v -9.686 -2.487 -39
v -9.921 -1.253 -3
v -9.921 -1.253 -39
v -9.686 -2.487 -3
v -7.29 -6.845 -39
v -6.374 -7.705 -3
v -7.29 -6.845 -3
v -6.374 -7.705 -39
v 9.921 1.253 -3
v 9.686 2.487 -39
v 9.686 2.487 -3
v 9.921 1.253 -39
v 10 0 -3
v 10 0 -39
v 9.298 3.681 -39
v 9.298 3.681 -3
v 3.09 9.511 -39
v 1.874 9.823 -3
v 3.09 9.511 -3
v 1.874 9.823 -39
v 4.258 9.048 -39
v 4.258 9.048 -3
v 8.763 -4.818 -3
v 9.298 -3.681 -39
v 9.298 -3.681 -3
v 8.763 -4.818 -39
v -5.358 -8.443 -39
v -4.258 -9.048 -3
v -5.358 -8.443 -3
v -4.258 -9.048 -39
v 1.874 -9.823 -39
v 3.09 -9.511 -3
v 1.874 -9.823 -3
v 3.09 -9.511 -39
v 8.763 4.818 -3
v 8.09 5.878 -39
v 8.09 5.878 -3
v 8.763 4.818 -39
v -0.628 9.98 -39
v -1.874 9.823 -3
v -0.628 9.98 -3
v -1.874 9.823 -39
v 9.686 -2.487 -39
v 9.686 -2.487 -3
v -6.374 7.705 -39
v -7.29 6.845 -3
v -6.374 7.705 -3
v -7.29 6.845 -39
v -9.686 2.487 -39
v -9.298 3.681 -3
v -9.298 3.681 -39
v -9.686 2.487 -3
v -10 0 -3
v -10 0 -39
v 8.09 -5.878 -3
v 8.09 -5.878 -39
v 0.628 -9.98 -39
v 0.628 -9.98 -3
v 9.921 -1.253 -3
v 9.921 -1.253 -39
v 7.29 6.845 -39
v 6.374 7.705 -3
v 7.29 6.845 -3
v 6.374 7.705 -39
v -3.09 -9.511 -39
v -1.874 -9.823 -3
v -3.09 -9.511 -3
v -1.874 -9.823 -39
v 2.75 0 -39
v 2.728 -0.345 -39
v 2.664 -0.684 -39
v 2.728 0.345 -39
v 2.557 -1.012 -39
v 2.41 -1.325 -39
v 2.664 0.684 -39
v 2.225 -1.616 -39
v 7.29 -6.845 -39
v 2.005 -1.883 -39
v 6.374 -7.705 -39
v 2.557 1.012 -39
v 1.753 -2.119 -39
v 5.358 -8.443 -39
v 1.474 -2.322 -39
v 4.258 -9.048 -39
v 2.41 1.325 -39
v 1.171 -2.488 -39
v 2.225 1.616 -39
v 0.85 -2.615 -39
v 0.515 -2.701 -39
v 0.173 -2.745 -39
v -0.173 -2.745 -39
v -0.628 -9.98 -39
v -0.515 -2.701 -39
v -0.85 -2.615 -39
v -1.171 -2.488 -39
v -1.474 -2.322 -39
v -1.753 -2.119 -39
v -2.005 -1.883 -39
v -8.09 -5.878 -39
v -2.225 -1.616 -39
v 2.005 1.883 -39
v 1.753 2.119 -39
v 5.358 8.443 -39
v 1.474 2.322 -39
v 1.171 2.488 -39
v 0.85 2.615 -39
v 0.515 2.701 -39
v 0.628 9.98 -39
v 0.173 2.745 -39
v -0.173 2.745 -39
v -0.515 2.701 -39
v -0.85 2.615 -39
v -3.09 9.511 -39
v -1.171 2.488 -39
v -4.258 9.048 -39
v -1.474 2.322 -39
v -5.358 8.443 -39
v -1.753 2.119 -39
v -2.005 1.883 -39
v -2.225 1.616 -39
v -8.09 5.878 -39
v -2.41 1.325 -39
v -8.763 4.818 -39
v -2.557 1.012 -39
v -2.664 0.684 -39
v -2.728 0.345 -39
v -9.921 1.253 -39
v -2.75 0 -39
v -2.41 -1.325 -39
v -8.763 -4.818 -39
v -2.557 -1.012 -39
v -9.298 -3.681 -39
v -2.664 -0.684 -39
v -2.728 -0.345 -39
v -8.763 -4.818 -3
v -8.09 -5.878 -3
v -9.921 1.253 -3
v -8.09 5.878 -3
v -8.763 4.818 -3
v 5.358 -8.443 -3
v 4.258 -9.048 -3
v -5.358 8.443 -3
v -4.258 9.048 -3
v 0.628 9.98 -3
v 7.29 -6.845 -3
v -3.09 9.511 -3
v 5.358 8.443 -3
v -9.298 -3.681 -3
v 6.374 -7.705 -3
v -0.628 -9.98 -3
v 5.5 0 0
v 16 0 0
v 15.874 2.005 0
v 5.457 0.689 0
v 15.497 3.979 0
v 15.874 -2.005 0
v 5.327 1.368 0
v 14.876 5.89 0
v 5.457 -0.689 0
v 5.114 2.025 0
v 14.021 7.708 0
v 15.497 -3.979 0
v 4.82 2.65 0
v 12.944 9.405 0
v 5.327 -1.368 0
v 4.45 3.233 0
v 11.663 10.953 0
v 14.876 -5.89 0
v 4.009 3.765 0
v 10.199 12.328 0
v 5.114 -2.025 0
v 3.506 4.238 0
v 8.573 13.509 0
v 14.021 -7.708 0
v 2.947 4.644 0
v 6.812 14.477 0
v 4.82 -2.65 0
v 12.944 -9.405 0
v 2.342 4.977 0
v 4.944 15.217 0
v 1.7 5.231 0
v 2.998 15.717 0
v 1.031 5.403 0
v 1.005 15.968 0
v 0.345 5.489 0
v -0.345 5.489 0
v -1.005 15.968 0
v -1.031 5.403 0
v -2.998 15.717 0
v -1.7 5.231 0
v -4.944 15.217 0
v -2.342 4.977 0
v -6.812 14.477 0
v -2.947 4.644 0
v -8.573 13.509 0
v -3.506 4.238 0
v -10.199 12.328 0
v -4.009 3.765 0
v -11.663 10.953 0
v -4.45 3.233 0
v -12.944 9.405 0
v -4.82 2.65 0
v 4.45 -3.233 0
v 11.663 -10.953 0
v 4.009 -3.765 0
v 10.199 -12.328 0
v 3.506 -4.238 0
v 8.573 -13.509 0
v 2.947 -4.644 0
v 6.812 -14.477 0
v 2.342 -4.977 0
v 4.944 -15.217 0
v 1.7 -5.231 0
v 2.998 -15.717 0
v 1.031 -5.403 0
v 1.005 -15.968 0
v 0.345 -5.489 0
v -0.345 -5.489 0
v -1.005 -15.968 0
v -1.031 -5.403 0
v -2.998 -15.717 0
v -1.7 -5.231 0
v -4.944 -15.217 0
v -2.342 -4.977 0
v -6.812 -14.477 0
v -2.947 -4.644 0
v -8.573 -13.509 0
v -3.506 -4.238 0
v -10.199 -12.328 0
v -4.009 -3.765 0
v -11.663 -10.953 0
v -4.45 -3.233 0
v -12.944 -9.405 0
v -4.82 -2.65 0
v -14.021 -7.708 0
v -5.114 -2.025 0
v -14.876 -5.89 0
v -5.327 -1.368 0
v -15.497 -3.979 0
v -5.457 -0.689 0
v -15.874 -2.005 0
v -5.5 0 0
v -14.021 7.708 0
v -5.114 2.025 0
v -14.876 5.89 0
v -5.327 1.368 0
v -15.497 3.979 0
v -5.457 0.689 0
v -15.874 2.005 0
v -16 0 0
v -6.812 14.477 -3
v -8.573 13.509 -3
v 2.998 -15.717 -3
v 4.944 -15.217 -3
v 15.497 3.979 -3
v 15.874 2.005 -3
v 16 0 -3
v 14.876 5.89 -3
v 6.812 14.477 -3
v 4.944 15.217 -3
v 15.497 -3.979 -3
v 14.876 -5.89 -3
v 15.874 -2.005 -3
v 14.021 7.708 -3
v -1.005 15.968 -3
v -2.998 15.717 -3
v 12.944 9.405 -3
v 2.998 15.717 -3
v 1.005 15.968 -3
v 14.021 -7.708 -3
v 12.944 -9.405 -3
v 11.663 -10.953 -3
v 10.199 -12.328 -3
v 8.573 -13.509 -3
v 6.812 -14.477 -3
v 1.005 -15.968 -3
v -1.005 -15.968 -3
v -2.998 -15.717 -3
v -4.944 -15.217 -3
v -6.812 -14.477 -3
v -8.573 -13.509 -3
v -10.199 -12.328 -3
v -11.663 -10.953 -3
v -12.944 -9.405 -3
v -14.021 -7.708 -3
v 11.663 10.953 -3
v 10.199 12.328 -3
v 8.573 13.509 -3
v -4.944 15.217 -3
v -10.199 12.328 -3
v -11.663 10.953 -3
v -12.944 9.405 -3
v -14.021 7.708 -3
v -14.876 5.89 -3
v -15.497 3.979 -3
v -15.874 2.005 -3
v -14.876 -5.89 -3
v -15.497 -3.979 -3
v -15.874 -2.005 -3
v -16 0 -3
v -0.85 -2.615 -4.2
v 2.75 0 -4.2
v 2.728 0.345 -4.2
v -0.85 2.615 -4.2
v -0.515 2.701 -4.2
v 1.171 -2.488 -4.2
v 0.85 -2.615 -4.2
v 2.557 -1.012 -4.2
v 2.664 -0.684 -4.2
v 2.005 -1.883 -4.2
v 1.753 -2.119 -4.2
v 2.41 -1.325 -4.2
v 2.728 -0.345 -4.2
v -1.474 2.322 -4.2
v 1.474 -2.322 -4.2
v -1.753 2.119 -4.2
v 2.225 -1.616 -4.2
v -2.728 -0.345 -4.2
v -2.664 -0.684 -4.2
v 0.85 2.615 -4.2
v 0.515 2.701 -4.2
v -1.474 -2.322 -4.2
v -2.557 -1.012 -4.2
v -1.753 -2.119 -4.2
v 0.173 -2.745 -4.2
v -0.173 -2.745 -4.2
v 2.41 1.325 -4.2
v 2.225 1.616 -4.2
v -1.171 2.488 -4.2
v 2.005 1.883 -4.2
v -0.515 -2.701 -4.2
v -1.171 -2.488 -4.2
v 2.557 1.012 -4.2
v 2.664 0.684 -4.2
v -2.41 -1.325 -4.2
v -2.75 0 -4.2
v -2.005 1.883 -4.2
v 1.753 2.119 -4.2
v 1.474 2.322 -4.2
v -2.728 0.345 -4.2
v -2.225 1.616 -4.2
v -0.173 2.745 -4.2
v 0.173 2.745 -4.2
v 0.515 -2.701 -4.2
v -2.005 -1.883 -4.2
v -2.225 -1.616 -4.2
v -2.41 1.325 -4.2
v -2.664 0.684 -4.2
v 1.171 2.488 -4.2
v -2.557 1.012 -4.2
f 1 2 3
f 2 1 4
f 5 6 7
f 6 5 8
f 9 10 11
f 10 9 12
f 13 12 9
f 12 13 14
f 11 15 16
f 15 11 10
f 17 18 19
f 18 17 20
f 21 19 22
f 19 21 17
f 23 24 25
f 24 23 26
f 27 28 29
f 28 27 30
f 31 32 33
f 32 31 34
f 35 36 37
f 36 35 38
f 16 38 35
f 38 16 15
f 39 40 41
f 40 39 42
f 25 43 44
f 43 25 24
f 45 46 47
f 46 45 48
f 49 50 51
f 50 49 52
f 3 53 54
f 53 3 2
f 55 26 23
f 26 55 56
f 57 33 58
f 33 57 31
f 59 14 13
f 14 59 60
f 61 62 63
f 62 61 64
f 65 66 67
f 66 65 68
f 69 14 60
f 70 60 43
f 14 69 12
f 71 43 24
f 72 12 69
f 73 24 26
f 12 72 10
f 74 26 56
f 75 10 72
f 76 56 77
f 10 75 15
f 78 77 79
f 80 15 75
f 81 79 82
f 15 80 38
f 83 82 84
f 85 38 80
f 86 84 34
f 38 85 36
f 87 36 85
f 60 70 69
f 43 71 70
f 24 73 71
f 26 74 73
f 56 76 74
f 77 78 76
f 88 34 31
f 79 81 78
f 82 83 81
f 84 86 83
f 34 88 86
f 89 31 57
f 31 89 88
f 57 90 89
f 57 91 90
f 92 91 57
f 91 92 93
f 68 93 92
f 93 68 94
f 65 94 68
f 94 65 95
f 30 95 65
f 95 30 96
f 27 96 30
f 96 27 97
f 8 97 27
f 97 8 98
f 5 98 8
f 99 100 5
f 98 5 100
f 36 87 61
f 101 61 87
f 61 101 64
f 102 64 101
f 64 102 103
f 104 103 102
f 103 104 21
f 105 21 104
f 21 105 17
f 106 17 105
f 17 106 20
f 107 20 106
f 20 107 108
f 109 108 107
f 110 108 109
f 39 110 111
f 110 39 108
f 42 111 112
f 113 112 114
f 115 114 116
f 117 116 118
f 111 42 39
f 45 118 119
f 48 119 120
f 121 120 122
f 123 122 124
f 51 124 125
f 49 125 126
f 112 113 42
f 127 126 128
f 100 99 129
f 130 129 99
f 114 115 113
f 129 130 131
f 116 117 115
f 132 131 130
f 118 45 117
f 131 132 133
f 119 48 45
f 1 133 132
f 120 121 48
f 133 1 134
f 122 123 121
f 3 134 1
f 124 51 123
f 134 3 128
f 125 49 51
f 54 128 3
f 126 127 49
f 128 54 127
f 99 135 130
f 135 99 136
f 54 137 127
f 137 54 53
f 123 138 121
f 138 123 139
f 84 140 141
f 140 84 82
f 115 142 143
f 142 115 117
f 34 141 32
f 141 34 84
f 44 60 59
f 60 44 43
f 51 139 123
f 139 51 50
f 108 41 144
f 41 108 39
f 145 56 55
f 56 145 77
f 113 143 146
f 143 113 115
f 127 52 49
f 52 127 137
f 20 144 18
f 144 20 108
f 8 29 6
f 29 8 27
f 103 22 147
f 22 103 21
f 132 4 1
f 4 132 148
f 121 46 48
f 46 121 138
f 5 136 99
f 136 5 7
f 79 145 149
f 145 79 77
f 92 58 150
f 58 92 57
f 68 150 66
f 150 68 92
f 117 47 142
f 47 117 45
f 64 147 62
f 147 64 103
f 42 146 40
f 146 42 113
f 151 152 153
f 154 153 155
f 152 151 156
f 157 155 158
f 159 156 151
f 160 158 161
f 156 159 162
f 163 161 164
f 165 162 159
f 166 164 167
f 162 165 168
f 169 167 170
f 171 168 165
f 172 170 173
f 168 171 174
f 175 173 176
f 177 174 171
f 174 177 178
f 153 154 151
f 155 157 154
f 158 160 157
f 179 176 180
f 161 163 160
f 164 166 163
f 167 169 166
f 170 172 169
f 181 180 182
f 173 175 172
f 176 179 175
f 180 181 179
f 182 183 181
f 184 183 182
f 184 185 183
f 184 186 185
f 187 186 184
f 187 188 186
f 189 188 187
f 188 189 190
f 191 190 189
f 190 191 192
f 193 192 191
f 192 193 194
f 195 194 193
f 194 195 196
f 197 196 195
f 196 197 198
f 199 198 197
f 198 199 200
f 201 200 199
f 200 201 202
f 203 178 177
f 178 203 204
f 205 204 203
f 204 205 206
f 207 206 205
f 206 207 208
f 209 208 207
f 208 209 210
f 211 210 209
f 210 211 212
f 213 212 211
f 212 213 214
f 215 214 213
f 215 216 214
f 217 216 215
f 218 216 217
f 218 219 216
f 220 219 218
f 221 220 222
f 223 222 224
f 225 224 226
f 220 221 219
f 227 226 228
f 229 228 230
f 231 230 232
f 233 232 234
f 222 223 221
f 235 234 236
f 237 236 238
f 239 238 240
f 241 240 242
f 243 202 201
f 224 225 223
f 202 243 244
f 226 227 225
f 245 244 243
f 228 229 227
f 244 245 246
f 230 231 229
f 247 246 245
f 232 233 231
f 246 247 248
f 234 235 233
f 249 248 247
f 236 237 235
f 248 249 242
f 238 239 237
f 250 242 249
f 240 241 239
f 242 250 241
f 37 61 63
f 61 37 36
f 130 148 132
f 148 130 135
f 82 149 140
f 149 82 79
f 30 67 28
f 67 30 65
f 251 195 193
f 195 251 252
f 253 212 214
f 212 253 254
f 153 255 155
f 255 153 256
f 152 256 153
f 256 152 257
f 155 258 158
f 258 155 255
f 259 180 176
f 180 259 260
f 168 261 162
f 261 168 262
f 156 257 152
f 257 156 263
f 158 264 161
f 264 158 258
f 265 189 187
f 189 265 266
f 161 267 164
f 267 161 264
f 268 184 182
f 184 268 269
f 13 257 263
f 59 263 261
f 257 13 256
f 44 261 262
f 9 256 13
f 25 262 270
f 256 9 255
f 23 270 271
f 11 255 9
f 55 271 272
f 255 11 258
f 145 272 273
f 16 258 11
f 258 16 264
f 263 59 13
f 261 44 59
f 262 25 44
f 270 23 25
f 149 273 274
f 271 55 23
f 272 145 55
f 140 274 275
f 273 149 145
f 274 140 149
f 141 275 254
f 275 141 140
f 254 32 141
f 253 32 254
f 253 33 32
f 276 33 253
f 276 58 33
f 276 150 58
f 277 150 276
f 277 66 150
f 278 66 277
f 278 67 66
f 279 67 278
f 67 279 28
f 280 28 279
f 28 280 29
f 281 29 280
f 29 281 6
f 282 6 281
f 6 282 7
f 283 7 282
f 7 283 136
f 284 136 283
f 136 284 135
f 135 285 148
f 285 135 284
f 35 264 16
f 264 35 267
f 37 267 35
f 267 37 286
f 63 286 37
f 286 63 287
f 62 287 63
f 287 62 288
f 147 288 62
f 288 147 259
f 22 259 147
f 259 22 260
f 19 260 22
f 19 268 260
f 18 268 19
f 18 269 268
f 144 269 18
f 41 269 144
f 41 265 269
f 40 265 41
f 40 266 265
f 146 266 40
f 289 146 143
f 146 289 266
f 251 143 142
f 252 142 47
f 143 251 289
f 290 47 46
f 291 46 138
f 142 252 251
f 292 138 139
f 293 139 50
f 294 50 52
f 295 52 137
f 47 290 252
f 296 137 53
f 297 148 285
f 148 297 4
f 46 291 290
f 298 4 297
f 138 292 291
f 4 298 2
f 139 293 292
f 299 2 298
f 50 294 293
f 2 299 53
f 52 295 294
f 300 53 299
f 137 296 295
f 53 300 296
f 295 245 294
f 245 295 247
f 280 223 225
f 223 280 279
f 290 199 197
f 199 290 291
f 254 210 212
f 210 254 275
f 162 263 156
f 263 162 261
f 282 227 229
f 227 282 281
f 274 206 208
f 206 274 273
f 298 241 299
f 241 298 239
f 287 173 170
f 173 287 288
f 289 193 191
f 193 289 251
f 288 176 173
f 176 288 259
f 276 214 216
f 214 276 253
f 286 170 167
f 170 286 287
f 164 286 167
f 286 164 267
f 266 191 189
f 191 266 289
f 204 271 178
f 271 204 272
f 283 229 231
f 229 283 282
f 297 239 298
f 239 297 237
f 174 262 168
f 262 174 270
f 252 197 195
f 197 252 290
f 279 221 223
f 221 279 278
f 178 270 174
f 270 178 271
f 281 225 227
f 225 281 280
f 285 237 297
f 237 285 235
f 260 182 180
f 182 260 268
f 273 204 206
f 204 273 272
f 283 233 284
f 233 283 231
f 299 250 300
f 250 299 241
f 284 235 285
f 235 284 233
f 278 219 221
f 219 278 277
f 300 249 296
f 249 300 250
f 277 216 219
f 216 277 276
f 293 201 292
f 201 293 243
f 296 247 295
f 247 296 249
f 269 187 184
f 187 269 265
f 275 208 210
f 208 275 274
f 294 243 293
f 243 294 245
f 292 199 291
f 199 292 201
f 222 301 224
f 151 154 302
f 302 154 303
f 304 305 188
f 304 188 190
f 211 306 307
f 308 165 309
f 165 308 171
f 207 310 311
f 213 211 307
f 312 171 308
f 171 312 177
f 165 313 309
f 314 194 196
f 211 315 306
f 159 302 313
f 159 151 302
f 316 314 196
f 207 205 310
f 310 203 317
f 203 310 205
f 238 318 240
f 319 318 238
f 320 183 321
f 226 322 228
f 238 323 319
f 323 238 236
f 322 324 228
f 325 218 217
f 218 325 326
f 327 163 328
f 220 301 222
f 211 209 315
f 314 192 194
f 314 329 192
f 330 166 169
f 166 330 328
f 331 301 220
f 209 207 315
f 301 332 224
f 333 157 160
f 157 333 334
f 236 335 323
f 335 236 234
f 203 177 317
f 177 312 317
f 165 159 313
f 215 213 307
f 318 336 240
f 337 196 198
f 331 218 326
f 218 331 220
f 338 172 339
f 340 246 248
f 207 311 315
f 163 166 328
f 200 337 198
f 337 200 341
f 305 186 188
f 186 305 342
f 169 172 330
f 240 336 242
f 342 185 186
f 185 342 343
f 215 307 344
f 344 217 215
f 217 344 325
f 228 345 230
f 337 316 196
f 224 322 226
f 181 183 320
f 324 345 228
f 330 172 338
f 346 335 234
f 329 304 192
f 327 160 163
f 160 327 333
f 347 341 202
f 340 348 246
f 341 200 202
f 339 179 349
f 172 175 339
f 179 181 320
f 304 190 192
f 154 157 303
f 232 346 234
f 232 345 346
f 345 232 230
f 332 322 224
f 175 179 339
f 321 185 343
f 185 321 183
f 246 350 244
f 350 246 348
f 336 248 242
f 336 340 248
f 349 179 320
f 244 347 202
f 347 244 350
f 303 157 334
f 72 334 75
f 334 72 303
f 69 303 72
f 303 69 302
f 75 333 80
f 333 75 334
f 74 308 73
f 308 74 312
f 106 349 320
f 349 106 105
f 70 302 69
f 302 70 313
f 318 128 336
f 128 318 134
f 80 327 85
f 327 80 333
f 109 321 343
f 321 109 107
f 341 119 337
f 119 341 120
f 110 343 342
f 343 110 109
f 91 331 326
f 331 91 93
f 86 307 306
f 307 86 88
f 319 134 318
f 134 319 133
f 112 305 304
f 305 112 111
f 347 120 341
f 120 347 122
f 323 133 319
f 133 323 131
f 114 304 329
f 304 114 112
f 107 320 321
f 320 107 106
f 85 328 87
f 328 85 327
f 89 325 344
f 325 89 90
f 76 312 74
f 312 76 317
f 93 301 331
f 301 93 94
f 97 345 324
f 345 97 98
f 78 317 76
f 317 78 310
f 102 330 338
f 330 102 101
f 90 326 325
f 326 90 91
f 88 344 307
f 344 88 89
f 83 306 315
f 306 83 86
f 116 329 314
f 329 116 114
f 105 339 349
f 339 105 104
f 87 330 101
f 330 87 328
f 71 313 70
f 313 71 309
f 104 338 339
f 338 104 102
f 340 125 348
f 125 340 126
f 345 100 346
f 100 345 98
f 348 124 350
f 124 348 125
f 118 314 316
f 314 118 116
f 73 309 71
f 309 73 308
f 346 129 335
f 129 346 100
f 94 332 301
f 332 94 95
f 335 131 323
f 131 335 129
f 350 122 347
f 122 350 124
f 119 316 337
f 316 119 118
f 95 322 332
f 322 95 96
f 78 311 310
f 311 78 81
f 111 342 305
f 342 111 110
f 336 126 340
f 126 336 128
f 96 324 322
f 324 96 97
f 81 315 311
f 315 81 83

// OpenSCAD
$fn = 50;


difference() {
	union() {
		translate(v = [0, 0, -39.0000000000]) {
			cylinder(h = 39, r = 10.0000000000);
		}
		translate(v = [0, 0, -3.0000000000]) {
			cylinder(h = 3, r = 16.0000000000);
		}
	}
	union() {
		translate(v = [0, 0, 0]) {
			rotate(a = [0, 0, 0]) {
				difference() {
					union() {
						#translate(v = [0, 0, -39.0000000000]) {
							cylinder(h = 39, r = 2.2500000000);
						}
						#translate(v = [0, 0, -4.2000000000]) {
							cylinder(h = 4.2000000000, r1 = 2.7500000000, r2 = 5.5000000000);
						}
						#translate(v = [0, 0, -39.0000000000]) {
							cylinder(h = 39, r = 2.7500000000);
						}
						#translate(v = [0, 0, -39.0000000000]) {
							cylinder(h = 39, r = 2.2500000000);
						}
					}
					union();
				}
			}
		}
	}
}
